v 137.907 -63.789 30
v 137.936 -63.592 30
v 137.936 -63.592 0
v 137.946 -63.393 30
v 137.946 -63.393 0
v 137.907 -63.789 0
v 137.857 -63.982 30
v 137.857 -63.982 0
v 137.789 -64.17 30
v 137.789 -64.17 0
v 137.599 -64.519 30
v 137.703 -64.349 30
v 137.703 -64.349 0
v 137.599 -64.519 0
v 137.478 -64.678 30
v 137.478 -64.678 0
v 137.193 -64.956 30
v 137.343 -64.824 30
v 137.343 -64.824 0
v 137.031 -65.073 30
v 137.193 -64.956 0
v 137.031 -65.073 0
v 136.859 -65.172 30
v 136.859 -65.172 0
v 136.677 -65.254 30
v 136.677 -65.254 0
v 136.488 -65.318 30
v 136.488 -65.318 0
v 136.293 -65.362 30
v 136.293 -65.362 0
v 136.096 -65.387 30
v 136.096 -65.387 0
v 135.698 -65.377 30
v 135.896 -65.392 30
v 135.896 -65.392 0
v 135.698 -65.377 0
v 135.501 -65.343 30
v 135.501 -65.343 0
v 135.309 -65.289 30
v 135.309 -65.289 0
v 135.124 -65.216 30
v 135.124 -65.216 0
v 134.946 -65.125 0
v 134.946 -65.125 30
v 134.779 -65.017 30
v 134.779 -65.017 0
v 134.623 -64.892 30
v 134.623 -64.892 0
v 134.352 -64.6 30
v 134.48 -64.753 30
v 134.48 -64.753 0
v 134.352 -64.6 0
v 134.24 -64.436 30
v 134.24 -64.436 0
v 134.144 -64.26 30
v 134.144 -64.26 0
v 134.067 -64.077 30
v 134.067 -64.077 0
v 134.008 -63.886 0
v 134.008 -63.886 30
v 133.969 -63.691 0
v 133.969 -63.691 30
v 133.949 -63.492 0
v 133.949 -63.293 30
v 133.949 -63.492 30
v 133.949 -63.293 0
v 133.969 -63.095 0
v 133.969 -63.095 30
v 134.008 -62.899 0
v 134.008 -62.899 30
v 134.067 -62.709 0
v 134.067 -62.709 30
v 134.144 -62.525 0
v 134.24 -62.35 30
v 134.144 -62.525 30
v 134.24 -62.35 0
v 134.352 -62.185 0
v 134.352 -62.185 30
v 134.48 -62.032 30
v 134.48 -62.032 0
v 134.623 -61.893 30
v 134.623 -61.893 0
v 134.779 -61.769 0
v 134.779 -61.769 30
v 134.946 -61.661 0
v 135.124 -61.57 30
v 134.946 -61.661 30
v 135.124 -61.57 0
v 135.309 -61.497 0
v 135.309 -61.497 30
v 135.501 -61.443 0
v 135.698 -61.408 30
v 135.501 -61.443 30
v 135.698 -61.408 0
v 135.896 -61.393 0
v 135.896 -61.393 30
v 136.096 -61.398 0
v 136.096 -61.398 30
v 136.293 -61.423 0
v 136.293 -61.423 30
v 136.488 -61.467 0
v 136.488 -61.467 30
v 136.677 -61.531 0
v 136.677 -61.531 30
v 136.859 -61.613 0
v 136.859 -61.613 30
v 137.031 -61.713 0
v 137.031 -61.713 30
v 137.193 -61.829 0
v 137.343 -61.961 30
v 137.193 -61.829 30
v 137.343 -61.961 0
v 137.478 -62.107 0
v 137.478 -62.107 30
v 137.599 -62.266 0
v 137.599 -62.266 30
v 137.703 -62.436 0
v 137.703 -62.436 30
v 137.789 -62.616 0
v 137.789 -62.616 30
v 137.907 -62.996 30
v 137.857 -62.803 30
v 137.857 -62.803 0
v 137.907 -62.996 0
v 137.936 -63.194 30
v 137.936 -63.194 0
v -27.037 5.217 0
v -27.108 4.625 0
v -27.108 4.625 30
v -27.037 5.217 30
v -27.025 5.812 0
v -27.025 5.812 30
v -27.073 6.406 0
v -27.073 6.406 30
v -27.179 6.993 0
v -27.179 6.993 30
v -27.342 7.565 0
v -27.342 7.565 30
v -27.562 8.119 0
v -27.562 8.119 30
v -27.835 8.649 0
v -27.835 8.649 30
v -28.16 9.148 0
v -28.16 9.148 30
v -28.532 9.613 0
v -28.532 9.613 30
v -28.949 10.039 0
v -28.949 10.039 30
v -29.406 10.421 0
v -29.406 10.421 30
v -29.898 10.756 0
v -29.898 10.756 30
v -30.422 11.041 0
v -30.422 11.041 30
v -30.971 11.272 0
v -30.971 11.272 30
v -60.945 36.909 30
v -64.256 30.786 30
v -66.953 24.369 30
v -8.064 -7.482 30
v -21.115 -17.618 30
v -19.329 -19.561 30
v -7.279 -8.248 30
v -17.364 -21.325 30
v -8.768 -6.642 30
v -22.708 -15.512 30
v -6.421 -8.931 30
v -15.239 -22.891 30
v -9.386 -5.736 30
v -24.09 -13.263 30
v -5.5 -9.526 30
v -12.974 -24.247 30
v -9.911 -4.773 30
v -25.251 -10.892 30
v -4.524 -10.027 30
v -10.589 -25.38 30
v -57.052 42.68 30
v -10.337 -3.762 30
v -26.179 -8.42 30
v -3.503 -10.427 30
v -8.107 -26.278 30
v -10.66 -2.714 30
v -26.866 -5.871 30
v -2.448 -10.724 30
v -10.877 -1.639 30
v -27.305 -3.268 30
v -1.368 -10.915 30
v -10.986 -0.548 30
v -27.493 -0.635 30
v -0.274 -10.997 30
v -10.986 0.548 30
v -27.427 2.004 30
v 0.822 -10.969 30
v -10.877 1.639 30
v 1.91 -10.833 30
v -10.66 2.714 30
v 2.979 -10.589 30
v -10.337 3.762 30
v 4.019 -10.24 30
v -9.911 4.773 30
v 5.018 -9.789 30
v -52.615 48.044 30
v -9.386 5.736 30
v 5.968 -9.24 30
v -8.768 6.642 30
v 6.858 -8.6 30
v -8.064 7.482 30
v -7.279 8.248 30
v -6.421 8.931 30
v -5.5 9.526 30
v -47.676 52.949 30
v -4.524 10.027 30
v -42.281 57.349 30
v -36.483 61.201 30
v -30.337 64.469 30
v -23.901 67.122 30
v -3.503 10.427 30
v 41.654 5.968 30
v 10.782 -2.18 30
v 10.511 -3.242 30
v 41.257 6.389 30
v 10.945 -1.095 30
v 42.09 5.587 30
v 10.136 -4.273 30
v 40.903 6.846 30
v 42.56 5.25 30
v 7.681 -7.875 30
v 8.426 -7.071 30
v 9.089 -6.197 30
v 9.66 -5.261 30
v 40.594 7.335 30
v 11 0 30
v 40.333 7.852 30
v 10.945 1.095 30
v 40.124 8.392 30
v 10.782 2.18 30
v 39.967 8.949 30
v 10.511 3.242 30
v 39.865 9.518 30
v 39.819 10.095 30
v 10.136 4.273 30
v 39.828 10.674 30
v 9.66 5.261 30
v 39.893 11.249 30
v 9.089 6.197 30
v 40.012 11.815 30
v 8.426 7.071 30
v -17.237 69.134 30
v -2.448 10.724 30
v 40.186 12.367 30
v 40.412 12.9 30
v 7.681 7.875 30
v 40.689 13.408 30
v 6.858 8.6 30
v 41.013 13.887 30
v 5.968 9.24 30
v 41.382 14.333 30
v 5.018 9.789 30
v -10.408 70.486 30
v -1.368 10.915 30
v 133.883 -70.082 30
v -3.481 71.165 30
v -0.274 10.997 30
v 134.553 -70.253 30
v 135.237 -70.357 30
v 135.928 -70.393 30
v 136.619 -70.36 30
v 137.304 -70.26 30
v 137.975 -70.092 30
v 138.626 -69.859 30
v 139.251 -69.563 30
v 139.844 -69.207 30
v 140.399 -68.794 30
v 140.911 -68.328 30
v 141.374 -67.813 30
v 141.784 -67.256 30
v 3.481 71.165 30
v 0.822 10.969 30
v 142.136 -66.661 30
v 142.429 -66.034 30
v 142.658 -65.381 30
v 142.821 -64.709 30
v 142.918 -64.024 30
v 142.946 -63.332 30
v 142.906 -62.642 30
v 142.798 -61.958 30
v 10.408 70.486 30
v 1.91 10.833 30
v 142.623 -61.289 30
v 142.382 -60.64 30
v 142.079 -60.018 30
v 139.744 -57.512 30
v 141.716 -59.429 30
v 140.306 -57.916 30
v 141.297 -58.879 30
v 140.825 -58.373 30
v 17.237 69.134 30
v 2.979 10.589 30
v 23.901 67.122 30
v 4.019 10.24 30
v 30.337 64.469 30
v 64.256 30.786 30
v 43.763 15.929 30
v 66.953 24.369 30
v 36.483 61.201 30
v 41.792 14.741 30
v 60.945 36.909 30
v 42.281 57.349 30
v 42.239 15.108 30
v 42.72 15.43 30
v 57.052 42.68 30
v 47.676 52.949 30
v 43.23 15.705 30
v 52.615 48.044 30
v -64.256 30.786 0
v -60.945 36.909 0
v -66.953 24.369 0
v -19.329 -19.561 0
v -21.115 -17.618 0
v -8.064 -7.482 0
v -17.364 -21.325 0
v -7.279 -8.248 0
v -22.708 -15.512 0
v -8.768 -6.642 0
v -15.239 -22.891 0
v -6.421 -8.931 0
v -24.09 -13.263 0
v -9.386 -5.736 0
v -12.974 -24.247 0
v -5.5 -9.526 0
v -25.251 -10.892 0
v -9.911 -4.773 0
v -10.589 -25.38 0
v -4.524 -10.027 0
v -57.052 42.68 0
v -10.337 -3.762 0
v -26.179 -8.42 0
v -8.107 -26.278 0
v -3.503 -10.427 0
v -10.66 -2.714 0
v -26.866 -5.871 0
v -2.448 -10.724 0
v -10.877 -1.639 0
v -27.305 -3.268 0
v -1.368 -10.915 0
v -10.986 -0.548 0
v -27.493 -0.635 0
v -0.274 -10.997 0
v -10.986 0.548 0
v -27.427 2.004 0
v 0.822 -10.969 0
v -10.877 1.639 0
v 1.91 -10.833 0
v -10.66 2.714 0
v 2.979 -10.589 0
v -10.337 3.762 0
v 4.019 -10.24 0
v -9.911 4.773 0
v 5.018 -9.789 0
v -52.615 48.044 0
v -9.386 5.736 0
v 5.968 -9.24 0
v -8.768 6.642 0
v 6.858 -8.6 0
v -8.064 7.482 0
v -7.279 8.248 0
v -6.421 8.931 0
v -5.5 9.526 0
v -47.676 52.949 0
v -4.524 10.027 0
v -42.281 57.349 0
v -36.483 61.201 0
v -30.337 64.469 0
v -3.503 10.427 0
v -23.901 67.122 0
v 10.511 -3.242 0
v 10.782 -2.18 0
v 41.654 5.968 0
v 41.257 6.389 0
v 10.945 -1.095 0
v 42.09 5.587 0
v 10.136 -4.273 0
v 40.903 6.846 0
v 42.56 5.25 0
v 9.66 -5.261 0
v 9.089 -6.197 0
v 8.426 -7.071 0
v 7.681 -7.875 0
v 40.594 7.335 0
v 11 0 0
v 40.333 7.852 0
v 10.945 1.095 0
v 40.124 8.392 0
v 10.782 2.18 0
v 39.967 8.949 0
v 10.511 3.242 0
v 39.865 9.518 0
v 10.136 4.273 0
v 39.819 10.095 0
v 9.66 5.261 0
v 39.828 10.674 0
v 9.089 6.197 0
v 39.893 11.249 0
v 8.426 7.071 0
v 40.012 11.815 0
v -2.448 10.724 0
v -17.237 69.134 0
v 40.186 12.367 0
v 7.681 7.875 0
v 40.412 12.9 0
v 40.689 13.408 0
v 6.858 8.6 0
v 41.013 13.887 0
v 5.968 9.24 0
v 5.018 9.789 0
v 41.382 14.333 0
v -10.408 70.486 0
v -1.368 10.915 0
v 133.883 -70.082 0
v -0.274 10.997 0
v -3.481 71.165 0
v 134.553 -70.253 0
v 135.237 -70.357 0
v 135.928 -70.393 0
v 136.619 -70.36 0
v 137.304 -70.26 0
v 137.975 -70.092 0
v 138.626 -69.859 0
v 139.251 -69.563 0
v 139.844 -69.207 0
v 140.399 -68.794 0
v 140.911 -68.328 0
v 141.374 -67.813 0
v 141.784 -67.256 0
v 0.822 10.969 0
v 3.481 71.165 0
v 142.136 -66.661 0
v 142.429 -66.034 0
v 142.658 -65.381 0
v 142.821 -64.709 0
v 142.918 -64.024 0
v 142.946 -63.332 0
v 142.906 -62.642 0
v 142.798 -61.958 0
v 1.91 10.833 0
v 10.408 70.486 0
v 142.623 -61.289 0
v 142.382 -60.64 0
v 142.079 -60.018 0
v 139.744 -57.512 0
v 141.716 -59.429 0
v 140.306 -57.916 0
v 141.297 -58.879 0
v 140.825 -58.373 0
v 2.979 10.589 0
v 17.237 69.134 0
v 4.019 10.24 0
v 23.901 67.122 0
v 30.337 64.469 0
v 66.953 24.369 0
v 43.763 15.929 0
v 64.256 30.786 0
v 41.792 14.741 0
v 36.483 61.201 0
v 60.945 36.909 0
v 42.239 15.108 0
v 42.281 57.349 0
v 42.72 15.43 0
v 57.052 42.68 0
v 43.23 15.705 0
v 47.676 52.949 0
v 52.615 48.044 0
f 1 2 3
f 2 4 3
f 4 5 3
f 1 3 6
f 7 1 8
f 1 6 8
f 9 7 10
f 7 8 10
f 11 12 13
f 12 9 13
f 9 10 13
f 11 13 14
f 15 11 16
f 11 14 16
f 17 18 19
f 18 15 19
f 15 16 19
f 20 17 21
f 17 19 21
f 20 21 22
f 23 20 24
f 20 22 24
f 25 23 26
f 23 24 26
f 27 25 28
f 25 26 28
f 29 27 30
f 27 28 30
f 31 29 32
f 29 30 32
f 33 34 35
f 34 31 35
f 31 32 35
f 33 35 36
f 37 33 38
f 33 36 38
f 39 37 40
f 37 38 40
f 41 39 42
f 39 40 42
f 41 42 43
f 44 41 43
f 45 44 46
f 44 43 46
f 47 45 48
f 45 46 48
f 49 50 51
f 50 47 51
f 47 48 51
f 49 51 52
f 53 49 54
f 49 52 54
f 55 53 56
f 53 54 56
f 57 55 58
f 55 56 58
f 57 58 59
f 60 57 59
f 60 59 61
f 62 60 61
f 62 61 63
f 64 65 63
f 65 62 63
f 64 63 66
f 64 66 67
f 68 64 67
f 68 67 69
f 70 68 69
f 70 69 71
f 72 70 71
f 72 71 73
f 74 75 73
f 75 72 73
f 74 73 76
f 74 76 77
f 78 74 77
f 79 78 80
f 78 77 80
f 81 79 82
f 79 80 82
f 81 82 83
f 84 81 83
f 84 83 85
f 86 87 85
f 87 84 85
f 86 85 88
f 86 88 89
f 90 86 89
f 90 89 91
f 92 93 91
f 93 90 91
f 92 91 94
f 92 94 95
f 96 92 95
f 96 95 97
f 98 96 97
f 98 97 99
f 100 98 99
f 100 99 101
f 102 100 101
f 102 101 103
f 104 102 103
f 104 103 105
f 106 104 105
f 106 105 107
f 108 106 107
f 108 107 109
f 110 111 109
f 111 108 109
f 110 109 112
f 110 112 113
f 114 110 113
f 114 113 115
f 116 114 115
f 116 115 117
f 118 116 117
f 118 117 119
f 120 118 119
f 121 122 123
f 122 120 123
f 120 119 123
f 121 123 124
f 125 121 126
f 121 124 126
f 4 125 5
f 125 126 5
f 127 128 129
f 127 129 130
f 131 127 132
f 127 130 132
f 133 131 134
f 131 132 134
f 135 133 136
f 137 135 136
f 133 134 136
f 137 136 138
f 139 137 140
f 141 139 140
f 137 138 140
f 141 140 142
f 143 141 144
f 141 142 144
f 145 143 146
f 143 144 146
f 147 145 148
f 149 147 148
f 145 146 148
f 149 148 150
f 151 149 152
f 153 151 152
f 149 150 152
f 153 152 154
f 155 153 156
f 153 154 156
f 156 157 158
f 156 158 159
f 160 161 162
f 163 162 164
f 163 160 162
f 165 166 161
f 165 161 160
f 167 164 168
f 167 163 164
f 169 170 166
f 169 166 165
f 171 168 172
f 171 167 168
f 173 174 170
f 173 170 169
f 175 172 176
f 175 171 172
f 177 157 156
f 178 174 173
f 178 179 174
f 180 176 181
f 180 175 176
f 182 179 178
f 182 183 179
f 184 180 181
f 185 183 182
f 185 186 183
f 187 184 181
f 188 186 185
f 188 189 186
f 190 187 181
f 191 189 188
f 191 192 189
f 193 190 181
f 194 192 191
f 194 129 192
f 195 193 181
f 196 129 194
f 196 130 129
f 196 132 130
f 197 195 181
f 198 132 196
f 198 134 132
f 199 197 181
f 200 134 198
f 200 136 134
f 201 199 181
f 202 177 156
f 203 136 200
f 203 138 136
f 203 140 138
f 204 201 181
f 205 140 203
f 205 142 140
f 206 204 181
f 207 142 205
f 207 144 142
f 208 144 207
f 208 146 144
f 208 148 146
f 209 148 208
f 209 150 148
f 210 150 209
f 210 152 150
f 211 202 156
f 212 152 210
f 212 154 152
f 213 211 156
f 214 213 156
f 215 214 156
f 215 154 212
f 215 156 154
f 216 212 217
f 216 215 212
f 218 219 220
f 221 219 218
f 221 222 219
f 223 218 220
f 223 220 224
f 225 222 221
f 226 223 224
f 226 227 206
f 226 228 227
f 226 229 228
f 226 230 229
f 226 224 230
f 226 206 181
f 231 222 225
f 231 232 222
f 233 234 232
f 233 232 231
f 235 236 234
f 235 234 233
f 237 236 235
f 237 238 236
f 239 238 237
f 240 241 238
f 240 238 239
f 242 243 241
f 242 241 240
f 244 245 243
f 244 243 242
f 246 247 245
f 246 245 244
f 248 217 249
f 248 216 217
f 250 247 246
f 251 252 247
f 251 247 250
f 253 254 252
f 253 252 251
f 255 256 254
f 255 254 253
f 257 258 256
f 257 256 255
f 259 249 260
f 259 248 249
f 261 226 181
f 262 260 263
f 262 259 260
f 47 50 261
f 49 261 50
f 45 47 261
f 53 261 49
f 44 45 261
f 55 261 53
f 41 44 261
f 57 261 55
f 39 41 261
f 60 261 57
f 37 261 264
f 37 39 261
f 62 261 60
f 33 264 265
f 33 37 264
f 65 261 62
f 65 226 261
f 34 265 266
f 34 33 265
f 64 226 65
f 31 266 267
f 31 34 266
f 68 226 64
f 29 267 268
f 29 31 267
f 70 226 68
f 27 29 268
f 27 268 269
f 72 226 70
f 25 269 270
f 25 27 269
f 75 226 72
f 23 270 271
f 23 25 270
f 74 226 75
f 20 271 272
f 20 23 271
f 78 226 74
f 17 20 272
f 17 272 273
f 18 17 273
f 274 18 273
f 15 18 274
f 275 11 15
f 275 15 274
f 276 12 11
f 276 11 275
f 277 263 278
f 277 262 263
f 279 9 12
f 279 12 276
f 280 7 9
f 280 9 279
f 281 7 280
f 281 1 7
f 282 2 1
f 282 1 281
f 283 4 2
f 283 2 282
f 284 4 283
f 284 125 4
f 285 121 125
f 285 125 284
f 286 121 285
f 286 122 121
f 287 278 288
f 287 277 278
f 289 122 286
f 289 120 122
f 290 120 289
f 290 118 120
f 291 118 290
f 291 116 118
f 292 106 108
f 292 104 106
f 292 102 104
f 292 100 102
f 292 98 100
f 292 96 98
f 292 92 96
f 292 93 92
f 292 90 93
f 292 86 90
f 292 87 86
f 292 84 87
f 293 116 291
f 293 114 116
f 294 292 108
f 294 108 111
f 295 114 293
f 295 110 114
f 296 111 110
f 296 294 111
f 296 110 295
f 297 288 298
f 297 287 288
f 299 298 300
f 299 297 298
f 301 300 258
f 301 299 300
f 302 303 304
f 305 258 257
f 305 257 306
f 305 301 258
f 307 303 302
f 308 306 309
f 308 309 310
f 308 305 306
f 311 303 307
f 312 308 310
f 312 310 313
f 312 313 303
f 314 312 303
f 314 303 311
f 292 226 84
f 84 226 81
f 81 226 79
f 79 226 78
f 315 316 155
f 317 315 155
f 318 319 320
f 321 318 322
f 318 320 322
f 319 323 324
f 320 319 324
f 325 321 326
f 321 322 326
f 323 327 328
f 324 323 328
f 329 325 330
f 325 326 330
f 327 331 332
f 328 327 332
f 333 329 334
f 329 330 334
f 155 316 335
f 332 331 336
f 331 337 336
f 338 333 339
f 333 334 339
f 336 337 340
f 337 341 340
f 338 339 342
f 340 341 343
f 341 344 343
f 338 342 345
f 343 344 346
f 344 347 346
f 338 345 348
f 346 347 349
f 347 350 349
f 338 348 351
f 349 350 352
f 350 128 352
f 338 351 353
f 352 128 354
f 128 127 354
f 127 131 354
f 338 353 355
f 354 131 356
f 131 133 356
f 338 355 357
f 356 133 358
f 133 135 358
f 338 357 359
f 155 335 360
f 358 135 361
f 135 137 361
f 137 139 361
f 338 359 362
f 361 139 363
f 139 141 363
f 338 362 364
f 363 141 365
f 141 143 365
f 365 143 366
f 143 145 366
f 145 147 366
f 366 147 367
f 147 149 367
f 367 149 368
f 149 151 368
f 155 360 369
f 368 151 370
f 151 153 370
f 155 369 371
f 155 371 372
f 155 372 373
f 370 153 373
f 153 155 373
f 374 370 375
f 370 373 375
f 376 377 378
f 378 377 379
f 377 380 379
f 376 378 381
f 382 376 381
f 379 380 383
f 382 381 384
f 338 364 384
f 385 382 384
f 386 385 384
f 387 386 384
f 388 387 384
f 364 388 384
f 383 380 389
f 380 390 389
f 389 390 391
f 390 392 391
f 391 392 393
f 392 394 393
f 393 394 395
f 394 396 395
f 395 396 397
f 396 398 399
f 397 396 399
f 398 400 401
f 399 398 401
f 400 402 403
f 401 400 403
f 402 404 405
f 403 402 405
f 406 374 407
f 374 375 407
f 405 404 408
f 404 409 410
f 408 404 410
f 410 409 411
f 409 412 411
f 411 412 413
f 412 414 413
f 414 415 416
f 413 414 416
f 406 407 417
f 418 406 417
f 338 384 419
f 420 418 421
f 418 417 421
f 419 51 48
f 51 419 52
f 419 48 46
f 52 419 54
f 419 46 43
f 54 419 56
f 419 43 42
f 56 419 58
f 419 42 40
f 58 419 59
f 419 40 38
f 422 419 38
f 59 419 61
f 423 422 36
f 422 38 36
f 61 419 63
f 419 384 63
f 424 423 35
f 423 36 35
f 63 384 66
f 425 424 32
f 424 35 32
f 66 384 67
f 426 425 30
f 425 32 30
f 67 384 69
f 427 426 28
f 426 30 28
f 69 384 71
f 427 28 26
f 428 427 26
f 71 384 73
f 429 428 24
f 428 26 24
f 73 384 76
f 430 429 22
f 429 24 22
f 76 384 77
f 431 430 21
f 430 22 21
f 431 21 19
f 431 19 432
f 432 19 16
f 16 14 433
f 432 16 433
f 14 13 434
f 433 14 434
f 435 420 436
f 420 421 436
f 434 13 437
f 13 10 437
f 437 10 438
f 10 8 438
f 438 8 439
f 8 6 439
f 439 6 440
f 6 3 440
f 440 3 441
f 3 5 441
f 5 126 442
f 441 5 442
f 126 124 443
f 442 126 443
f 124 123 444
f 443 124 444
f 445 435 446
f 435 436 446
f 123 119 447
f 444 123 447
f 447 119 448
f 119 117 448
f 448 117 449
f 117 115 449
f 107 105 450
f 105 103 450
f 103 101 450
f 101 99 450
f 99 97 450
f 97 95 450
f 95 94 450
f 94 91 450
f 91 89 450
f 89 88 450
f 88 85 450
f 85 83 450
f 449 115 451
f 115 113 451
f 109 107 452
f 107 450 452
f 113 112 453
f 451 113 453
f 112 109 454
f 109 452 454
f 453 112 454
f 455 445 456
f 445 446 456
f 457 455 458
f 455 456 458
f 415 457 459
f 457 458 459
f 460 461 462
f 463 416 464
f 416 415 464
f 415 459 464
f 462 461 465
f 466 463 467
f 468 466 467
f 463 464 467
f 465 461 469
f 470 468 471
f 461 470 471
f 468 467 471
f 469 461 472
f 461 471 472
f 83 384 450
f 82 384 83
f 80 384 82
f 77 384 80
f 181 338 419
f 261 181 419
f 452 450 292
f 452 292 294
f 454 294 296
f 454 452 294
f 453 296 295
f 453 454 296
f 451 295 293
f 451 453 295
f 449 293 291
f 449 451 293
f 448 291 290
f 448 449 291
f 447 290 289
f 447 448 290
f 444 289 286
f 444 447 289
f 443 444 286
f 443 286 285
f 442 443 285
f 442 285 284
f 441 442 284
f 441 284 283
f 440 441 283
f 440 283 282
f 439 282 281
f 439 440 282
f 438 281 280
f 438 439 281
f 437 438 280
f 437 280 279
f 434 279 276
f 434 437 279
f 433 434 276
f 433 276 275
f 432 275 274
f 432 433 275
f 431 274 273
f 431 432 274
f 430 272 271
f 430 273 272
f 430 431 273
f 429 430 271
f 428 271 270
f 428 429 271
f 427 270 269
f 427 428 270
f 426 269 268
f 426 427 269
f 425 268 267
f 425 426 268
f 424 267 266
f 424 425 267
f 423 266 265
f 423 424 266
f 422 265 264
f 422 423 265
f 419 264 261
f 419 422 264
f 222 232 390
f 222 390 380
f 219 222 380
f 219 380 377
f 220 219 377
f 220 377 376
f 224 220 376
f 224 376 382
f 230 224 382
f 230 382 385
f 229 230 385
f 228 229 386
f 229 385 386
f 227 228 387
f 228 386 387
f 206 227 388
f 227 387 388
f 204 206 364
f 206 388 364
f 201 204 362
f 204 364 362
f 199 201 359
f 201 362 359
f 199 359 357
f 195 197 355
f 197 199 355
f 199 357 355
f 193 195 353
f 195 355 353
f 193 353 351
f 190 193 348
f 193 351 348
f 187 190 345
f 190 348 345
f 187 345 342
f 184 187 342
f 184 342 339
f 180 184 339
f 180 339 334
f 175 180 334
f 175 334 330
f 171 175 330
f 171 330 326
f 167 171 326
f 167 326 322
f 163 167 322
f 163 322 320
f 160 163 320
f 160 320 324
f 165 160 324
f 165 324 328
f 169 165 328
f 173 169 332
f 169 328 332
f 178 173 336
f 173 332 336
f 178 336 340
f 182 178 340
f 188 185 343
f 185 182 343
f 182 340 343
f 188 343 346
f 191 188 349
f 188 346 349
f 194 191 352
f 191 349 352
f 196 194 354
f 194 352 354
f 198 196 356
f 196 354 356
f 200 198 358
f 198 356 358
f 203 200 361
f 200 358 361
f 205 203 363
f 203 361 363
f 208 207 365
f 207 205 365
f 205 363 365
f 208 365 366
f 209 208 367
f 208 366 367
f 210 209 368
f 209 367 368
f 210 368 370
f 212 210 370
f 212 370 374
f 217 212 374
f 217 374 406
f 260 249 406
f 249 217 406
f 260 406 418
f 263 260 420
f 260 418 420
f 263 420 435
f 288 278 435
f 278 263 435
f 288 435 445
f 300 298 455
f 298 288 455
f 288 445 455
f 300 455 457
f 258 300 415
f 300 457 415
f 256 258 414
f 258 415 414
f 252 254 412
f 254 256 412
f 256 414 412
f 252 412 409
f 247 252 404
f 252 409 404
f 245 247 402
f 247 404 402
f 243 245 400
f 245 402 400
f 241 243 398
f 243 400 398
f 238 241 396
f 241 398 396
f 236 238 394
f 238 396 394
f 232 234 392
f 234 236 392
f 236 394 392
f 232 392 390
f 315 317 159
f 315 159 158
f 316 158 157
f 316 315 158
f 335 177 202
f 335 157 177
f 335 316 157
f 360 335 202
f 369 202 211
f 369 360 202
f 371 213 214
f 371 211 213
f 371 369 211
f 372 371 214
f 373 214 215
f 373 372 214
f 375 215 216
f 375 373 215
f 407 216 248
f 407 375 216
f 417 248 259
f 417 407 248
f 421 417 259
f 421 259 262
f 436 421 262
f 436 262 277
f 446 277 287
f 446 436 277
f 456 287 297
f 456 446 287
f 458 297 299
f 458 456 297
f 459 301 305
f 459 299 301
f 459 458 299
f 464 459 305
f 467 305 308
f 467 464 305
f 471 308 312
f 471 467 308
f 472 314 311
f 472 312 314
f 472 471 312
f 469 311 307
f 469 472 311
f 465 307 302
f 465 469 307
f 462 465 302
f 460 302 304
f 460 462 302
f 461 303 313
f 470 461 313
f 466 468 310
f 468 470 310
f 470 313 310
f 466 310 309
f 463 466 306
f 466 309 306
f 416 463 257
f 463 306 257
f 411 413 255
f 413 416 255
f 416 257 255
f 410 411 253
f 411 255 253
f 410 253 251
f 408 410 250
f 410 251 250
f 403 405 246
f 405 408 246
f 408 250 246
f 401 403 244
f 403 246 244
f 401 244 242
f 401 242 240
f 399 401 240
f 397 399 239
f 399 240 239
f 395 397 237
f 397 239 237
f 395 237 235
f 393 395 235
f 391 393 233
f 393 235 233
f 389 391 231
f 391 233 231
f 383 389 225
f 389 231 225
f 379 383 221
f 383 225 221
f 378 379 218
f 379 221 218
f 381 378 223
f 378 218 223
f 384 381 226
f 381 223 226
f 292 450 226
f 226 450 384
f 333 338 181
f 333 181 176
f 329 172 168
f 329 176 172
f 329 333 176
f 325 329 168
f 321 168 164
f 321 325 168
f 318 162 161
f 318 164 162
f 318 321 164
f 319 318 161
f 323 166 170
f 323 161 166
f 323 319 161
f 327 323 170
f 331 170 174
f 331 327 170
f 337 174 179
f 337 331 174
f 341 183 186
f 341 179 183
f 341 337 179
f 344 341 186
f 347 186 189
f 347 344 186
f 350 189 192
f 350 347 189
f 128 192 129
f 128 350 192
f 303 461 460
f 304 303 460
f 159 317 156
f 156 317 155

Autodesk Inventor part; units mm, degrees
ref_plane "YZ Plane" through (0, 0, 0) normal (1, 0, 0) x (0, 1, 0)
ref_plane "XZ Plane" through (0, 0, 0) normal (0, 1, 0) x (-1, 0, 0)
ref_plane "XY Plane" through (0, 0, 0) normal (0, 0, 1) x (1, 0, 0)
sketch "Sketch1" plane through (0, 0, 0) normal (0, 0, 1) x (1, 0, 0)
  circle A0 centre (0, 0) radius 11
  circle A1 centre (0, 84) radius 14 construction
  circle A2 centre (0, 0) radius 72 construction
  circle A3 centre (0, 84) radius 12 construction
  line L0 (0, 84) -> (0, 0) construction
  line L1 (-67.6579, 24.6255) -> (0, 0) construction
  line L2 (67.6579, 24.6255) -> (0, 0) construction
  circle A4 centre (0, 84) radius 35 construction
  line L3 (-60, 71.9226) -> (-60, 144) construction
  line L4 (-60, 144) -> (60, 144) construction
  line L5 (60, 144) -> (60, 71.9226) construction
  circle A5 centre (0, 0) radius 27.5
  line L6 (25.3583, -10.6399) -> (60, 71.9226) construction
  line L7 (-60, 71.9226) -> (-25.3583, -10.6399) construction
  line L8 (0, 0) -> (135.9462, -63.3927) construction
  line L9 (-24.7487, 59.2513) -> (24.7487, 59.2513) construction
  circle A6 centre (0, 84) radius 60 construction
  arc A7 (67.6579, 24.6255) -> (-67.6579, 24.6255) centre (0, 0) ccw
  arc A8 (66.9531, 24.3689) -> (-66.9531, 24.3689) centre (0, 0) ccw
  line L10 (67.3977, 25.3289) -> (67.4014, 25.3302)
  circle A9 centre (135.9462, -63.3927) radius 2
  circle A10 centre (135.9462, -63.3927) radius 7
  line L11 (-67.6579, 24.6255) -> (0, 0)
  line L12 (0, 0) -> (67.6579, 24.6255)
  line L13 (-8.1067, -26.2779) -> (133.8826, -70.0817)
  line L14 (139.7438, -57.5124) -> (14.9192, 23.1013)
  point P0 (24.7487, 108.7487)
  point P1 (-24.7487, 108.7487)
  point P2 (-25.8415, 9.4056)
  point P3 (32.419, 11.7996)
  point P4 (66.9531, 24.3689)
  point P5 (-66.9531, 24.3689)
  dimension "d7" = 70
  dimension "d2" = 24
  dimension "d3" = 144
  dimension "d4" = 28
  dimension "d5" = 22
  dimension "d6" = 220
  dimension "d8" = 360
  dimension "d9" = 55
  dimension "d10" = 150
  dimension "d11" = 45
  dimension "d12" = 120
  dimension "d13" = 0.75
  dimension "d14" = 4
  dimension "d15" = 14
extrude "Extrusion1" add sketch "Sketch1" along normal blind 30 contours A0 L12 A5 L11 | A0 L11 A5 L12 | L12 L14 A10 L13 A5 | A5 L14 L12 | L11 A8 L12 L14 A5 | A10
fillet "Fillet1" radius 6 2 edges at (-25.8415, 9.4056, 15) (32.419, 11.7996, 15)
equation "\"d3\" = 6 * d2"
properties part number "RT_ARM_MC_008_Capstand_Arm"
